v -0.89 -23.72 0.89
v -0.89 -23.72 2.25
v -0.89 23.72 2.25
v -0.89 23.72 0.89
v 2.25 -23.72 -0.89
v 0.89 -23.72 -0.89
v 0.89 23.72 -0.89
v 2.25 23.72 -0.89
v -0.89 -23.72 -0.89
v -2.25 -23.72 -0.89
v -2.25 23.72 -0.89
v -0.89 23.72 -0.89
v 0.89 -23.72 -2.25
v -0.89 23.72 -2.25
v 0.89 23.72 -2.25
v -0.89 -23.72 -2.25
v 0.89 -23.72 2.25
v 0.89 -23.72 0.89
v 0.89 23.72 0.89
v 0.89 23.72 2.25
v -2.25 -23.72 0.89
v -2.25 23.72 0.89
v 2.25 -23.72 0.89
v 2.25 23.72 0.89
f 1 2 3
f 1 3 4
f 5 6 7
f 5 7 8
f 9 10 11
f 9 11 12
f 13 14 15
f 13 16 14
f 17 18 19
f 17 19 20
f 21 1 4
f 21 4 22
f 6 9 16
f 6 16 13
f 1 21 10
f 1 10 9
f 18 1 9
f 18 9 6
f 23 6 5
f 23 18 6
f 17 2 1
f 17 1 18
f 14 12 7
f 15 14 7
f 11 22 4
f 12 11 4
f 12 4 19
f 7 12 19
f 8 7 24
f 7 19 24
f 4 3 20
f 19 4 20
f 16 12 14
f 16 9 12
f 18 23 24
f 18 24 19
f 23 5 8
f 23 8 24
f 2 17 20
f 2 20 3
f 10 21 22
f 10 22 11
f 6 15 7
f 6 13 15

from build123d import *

# Parameters (mm, degrees)
F0_W     = 0.89
F0_H     = 0.89
F1_DEPTH = 23.72


with BuildPart() as f1:
    # F0 (on Front) → F1 (new body, symmetric)
    with BuildSketch(Plane.XZ):
        Polygon((-0.89, 0.89), (-2.25, 0.89), (-2.25, -0.89), (-0.89, -0.89), (-0.89, 0), align=None)
        Polygon((-0.89, 2.25), (-0.89, 0.89), (0, 0.89), (0.89, 0.89), (0.89, 2.25), align=None)
        with Locations((-0.445, 0.445)):
            Rectangle(F0_W, F0_H)
        with Locations((0.445, 0.445)):
            Rectangle(F0_W, F0_H)
        with Locations((-0.445, -0.445)):
            Rectangle(F0_W, F0_H)
        Polygon((0, -0.89), (-0.89, -0.89), (-0.89, -2.25), (0.89, -2.25), (0.89, -0.89), align=None)
        Polygon((2.25, 0.89), (0.89, 0.89), (0.89, 0), (0.89, -0.89), (2.25, -0.89), align=None)
        with Locations((0.445, -0.445)):
            Rectangle(F0_W, F0_H)
    extrude(amount=F1_DEPTH, both=True)


solid = f1.part
